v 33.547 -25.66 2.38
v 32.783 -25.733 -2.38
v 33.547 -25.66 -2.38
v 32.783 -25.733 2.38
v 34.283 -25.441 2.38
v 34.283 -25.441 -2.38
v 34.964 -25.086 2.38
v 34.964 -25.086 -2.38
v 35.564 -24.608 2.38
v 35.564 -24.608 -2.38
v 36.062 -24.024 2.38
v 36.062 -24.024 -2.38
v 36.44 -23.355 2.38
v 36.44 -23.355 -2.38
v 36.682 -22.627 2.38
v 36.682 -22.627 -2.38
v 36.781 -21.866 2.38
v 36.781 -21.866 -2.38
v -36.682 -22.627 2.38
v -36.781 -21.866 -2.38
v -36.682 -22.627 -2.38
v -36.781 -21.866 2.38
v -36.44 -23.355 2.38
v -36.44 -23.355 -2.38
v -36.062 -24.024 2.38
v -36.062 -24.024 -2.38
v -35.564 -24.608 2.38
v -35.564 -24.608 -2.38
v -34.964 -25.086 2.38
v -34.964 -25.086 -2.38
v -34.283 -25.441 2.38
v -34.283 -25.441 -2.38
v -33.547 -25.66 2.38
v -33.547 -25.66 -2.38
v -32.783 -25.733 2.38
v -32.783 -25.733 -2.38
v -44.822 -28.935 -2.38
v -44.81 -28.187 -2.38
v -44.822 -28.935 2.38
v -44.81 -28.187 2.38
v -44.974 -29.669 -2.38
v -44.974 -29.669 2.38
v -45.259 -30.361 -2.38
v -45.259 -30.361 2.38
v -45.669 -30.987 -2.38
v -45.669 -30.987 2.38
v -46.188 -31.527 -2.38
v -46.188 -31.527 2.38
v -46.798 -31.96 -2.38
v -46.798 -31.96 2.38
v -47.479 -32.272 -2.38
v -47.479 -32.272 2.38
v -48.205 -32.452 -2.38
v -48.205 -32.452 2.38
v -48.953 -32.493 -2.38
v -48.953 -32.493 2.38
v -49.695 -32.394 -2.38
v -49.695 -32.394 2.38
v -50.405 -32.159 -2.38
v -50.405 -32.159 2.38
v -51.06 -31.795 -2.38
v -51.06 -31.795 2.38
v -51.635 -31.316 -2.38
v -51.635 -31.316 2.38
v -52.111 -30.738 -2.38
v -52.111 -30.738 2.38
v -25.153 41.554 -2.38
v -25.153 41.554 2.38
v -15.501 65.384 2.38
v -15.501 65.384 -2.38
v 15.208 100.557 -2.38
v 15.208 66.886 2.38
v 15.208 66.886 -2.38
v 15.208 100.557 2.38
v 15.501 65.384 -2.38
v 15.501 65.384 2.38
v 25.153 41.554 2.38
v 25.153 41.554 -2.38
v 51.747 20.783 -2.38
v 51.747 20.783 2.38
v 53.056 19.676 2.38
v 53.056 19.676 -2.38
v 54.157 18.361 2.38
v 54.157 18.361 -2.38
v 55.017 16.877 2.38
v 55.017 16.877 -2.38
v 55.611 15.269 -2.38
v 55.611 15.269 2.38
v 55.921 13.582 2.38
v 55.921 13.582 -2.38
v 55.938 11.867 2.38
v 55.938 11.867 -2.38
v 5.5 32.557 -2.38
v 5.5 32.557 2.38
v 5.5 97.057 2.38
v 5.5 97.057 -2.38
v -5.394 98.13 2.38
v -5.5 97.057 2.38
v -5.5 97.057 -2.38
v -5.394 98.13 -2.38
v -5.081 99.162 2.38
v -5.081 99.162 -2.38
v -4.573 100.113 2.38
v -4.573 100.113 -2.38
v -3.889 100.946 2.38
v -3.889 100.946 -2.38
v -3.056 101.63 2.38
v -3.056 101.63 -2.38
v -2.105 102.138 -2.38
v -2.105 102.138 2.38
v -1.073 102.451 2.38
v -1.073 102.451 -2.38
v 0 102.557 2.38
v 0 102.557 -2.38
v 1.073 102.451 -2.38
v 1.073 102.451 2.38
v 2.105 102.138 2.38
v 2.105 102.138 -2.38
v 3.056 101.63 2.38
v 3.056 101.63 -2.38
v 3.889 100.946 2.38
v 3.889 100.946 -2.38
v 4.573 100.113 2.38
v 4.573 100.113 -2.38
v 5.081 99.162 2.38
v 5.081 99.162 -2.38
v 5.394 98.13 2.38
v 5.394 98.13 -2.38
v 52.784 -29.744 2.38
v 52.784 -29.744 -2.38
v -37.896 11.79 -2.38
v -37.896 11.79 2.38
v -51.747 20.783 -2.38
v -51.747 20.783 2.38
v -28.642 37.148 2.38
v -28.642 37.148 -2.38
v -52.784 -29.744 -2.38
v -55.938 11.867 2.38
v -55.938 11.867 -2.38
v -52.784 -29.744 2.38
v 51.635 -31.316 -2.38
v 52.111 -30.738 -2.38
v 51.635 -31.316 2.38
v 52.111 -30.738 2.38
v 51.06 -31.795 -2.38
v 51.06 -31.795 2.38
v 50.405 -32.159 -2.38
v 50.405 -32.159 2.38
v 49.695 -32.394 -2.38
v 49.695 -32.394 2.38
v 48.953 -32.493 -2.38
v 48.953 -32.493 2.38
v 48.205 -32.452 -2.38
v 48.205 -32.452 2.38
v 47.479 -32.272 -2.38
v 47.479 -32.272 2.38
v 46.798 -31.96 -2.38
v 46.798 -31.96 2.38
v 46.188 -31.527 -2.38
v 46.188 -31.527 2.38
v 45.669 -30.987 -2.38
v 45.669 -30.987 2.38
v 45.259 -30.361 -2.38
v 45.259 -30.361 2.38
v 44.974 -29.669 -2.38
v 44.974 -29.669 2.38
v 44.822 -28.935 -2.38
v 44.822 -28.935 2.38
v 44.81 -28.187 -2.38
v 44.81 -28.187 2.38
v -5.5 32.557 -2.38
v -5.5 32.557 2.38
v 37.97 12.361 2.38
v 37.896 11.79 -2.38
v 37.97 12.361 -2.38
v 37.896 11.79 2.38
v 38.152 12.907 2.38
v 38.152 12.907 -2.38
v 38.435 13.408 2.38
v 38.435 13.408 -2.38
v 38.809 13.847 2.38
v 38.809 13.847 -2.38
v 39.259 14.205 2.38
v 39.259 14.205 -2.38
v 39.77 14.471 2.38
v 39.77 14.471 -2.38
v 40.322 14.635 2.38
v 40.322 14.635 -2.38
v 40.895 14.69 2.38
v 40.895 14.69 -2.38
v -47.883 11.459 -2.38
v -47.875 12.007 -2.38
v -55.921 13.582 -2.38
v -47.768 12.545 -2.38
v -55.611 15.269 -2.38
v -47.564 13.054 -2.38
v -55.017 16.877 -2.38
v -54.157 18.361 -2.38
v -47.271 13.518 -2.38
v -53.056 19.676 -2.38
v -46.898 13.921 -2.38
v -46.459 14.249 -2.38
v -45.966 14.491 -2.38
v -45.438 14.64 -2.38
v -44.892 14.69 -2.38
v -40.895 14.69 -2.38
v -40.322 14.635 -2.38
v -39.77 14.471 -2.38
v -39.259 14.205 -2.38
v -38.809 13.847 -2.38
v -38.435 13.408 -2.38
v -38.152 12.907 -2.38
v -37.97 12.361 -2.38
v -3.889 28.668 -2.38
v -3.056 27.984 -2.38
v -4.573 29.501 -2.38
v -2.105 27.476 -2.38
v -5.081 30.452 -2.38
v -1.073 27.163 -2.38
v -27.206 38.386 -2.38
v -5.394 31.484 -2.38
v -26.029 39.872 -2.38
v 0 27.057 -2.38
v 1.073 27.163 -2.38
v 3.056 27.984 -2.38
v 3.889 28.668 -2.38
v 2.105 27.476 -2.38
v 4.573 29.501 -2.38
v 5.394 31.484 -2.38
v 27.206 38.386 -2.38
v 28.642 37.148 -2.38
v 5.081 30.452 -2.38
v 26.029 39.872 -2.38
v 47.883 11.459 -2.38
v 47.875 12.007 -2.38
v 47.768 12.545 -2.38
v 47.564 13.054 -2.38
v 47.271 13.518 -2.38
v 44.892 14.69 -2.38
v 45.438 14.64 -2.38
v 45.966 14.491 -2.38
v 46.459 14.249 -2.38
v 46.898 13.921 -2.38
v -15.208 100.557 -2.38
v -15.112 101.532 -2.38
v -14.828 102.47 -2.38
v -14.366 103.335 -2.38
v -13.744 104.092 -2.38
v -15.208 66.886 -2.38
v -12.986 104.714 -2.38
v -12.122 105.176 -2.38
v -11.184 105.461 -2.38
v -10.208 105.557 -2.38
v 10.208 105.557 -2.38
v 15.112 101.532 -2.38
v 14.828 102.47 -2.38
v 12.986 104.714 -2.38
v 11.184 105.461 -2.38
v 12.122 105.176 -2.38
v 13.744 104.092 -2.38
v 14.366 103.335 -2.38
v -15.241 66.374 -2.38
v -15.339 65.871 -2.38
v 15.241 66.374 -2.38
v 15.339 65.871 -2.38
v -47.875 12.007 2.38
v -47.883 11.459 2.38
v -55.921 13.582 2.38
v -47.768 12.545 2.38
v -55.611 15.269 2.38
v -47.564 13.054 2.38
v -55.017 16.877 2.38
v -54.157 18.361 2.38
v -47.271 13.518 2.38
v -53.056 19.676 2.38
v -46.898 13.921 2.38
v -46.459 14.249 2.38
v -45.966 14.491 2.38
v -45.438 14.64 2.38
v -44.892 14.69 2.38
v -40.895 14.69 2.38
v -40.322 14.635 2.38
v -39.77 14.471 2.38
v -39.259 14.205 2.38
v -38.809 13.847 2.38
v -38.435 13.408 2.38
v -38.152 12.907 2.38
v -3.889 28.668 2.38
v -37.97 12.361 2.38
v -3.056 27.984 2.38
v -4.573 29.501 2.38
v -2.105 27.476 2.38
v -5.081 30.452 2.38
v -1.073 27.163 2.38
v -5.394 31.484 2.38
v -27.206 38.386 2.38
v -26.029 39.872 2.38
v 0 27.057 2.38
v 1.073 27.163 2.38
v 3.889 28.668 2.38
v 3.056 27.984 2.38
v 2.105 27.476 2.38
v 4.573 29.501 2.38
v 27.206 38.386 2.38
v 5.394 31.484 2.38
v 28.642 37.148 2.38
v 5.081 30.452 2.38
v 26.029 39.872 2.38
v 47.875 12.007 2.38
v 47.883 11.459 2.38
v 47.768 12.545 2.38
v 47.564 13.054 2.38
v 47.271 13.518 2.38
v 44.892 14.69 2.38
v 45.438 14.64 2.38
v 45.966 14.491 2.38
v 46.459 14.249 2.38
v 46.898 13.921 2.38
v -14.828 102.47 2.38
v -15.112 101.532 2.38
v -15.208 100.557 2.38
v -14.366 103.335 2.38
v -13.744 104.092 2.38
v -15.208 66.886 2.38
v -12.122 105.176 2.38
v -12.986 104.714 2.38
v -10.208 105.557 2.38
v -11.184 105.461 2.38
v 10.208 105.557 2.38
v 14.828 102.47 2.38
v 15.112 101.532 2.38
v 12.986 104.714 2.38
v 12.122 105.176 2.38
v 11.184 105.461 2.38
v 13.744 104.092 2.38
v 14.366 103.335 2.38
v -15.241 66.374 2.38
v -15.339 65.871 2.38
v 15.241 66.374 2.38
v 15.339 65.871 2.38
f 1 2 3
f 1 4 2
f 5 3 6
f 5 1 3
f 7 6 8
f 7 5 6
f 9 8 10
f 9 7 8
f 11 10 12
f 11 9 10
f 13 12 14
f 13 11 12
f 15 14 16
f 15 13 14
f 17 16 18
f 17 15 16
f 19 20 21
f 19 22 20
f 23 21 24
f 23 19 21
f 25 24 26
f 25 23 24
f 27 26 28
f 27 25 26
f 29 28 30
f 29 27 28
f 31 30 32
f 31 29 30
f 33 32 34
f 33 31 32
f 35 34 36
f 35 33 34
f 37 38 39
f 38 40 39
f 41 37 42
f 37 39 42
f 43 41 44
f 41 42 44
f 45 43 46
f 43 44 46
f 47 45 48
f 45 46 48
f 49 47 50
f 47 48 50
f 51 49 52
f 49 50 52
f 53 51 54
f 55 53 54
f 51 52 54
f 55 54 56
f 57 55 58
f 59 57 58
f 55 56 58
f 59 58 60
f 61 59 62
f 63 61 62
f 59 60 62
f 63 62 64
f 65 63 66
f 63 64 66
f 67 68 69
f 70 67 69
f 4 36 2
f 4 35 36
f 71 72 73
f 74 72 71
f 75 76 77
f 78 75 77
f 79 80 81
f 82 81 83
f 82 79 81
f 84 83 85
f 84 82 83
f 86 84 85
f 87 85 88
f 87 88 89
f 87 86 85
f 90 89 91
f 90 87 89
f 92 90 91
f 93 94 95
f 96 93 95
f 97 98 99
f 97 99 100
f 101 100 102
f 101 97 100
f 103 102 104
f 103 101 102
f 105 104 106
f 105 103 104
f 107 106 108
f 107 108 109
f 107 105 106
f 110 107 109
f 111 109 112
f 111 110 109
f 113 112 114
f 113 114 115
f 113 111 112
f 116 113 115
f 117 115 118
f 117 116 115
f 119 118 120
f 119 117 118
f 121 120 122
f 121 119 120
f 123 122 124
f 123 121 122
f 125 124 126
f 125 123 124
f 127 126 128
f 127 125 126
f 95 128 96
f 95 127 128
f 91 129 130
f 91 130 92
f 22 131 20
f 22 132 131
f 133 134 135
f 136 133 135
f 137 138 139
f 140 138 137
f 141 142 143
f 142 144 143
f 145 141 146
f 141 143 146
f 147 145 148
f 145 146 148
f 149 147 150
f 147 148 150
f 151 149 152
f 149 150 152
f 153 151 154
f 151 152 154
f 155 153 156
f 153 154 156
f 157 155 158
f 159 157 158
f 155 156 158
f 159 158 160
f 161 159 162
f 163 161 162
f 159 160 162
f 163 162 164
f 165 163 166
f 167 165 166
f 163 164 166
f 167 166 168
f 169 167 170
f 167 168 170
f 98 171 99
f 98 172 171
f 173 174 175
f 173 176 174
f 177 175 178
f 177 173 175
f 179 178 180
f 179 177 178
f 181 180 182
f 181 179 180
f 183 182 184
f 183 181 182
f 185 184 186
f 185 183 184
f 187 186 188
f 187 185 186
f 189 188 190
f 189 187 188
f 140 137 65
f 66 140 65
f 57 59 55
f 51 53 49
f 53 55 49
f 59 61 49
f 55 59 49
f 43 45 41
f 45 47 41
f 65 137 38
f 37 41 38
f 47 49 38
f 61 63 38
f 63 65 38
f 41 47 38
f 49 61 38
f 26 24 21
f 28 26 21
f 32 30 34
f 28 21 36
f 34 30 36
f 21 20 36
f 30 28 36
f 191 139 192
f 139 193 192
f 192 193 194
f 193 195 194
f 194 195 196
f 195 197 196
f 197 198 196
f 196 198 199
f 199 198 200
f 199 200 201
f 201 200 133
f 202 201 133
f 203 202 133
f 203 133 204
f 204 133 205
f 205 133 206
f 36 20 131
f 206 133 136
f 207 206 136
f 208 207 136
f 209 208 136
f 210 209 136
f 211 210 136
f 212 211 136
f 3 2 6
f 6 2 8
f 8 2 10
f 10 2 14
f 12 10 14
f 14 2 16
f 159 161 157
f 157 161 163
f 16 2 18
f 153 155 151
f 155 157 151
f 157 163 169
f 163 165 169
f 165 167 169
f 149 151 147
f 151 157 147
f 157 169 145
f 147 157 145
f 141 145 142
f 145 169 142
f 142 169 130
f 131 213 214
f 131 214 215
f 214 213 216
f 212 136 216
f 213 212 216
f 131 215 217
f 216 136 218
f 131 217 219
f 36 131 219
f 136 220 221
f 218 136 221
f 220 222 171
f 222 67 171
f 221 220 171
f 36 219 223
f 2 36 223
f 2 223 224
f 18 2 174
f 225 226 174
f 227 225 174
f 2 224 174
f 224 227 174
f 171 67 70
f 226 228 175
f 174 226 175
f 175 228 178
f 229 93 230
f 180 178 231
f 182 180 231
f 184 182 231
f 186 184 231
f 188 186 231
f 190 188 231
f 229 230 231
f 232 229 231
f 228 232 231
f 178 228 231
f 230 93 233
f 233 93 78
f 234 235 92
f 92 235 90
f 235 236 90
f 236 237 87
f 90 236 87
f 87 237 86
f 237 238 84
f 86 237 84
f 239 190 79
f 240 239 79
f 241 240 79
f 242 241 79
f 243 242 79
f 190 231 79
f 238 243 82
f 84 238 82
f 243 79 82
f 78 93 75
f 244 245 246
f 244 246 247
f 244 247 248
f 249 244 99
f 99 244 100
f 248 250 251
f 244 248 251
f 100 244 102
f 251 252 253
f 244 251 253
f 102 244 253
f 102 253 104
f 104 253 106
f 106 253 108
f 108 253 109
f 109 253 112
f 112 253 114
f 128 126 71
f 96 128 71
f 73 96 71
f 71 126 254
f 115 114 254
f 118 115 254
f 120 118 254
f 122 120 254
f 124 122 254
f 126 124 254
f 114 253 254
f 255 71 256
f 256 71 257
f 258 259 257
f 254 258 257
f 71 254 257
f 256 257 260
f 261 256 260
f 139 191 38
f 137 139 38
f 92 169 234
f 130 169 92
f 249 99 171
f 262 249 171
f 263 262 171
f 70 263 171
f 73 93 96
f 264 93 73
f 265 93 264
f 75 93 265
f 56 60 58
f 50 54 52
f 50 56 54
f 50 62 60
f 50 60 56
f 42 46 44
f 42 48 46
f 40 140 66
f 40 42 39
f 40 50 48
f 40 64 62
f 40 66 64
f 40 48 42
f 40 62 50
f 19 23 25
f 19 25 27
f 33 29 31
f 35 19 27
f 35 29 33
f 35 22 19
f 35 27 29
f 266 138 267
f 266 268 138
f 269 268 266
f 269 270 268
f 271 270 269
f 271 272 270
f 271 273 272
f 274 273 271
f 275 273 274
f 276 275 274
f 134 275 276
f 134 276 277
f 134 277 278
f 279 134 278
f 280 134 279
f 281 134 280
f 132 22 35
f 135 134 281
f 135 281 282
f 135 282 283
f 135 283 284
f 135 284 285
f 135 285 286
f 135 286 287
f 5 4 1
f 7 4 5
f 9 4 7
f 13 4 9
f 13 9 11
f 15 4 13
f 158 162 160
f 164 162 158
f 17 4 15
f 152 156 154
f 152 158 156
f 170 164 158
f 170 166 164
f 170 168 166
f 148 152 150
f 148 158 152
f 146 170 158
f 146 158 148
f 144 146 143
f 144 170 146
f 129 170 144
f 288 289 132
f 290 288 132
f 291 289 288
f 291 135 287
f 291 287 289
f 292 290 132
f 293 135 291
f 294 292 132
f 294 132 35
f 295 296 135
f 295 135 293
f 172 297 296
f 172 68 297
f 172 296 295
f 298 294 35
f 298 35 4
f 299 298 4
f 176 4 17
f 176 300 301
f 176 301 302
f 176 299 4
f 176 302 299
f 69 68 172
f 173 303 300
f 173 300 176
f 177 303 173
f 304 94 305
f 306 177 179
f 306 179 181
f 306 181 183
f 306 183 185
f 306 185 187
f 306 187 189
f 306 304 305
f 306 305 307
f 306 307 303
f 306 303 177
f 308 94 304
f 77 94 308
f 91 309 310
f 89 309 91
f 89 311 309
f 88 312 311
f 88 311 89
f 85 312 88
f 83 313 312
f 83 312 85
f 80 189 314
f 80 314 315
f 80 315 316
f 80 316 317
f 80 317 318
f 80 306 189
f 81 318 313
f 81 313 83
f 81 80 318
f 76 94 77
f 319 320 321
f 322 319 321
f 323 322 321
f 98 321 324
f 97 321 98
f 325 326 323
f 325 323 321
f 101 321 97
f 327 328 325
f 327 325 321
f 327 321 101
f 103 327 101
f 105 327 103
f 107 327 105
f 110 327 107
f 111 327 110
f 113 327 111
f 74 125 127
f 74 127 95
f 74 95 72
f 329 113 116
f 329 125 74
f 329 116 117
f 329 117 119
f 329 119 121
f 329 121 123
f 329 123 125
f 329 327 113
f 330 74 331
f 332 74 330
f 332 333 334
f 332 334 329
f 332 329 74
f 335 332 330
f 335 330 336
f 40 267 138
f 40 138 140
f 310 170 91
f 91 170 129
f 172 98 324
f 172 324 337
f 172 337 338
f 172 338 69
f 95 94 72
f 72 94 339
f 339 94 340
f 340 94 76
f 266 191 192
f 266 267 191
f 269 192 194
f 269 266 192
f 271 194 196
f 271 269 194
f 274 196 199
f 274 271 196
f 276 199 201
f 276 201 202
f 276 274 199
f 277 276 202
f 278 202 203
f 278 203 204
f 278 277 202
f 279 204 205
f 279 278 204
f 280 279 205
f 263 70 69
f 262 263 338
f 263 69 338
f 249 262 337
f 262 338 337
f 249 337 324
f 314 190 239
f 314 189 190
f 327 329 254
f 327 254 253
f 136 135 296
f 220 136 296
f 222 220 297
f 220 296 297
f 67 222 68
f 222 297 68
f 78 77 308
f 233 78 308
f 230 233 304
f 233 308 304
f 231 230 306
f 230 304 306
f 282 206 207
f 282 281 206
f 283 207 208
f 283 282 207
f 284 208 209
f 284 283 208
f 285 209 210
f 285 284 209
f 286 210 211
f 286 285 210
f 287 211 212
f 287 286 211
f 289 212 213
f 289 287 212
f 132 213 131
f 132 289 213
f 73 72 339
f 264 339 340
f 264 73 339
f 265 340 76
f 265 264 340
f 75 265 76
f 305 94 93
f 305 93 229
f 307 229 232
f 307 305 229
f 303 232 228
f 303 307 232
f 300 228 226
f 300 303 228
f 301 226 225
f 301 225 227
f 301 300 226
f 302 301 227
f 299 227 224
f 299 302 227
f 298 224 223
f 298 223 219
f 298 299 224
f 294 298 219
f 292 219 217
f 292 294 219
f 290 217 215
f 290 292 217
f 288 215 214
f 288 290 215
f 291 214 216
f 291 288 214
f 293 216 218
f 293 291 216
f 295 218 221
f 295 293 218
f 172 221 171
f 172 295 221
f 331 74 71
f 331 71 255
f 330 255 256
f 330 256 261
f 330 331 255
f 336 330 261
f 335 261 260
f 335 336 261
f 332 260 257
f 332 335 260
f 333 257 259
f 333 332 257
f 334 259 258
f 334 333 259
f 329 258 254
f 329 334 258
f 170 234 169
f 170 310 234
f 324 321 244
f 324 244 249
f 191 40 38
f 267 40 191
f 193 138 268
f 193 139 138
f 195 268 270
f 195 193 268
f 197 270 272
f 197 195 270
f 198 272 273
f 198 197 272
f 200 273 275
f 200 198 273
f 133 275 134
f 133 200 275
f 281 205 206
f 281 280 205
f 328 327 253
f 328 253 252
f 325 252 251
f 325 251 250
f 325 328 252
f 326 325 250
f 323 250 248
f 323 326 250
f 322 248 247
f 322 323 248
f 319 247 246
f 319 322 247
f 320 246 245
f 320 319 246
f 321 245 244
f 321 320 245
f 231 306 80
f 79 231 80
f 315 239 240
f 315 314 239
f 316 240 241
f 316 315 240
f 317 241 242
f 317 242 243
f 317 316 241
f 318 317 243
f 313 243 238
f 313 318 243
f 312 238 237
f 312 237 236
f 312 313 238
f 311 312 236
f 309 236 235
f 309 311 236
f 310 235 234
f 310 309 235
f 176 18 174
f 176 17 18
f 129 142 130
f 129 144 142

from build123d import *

# Parameters (mm, degrees)
SALIENTE_EXTRUIR1_DEPTH    = 2.38
REDONDEO1_R                = 4
REDONDEO2_R                = 4
REDONDEO3_R                = 4
REDONDEO4_R                = 3
CORTAR_EXTRUIR1_DEPTH      = 119.368571569
CORTAR_EXTRUIR1_DEPTH_BACK = 119.368571569
CORTAR_EXTRUIR2_DEPTH      = 119.368571569
SALIENTE_EXTRUIR2_DEPTH    = 4.76
REDONDEO5_R                = 10


with BuildPart() as part:
    # Croquis1 → Saliente-Extruir1 (new, symmetric)
    with BuildSketch(Plane.XY):
        with BuildLine():
            Line((5.5, 65.157151242), (15.208163591, 65.157151242))
            Line((15.208163591, 65.157151242), (15.208163591, 103.706209284))
            Line((15.208163591, 103.706209284), (-15.208163591, 103.706209284))
            Line((-15.208163591, 103.706209284), (-15.208163591, 65.157151242))
            Line((-15.208163591, 65.157151242), (-5.5, 65.157151242))
            Line((-5.5, 65.157151242), (-5.5, 82.556930634))
            ThreePointArc((-5.5, 82.556930634), (0, 88.056930634), (5.5, 82.556930634))
            Line((5.5, 82.556930634), (5.5, 65.157151242))
        make_face()
        with BuildLine():
            Line((56.996730438, 25.832022394), (15.208163591, 65.157151242))
            Line((15.208163591, 65.157151242), (5.5, 65.157151242))
            Line((5.5, 65.157151242), (5.5, 42.556930634))
            ThreePointArc((5.5, 42.556930634), (0, 37.056930634), (-5.5, 42.556930634))
            Line((-5.5, 42.556930634), (-5.5, 65.157151242))
            Line((-5.5, 65.157151242), (-15.208163591, 65.157151242))
            Line((-15.208163591, 65.157151242), (-56.996730438, 25.832022394))
            Line((-56.996730438, 25.832022394), (-52.784065, -29.74367502))
            Line((-52.784065, -29.74367502), (-43.642993924, -43.246554306))
            Line((-43.642993924, -43.246554306), (-48.133553694, 14.690410374))
            Line((-48.133553694, 14.690410374), (-37.992388192, 14.690410374))
            Line((-37.992388192, 14.690410374), (-36.652824186, -25.733224315))
            Line((-36.652824186, -25.733224315), (36.652824186, -25.733224315))
            Line((36.652824186, -25.733224315), (37.992388192, 14.690410374))
            Line((37.992388192, 14.690410374), (48.133553694, 14.690410374))
            Line((48.133553694, 14.690410374), (43.642993924, -43.246554306))
            Line((43.642993924, -43.246554306), (52.784065, -29.74367502))
            Line((52.784065, -29.74367502), (56.996730438, 25.832022394))
        make_face()
    extrude(amount=SALIENTE_EXTRUIR1_DEPTH, both=True)

    # Redondeo1
    redondeo1_edges = [part.edges().sort_by_distance(p)[0] for p in [
        (43.642993924, -43.246554306, 0),
        (-43.642993924, -43.246554306, 0),
    ]]
    fillet(redondeo1_edges, radius=REDONDEO1_R)

    # Redondeo2
    redondeo2_edges = [part.edges().sort_by_distance(p)[0] for p in [
        (36.652824186, -25.733224315, 0),
        (-36.652824186, -25.733224315, 0),
    ]]
    fillet(redondeo2_edges, radius=REDONDEO2_R)

    # Redondeo3
    redondeo3_edges = [part.edges().sort_by_distance(p)[0] for p in [
        (56.996730438, 25.832022394, 0),
        (-56.996730438, 25.832022394, 0),
        (-15.208163591, 65.157151242, 0),
        (-15.208163591, 103.706209284, 0),
        (15.208163591, 103.706209284, 0),
        (15.208163591, 65.157151242, 0),
    ]]
    fillet(redondeo3_edges, radius=REDONDEO3_R)

    # Redondeo4
    redondeo4_edges = [part.edges().sort_by_distance(p)[0] for p in [
        (48.133553694, 14.690410374, 0),
        (37.992388192, 14.690410374, 0),
        (-37.992388192, 14.690410374, 0),
        (-48.133553694, 14.690410374, 0),
    ]]
    fillet(redondeo4_edges, radius=REDONDEO4_R)

    # Croquis2 → Cortar-Extruir1 (cut, two sides: drawn at the far end of the back side and taken through both)
    with BuildSketch(Plane(origin=(0, 0, -2.38), x_dir=(-1, 0, 0), z_dir=(0, 0, -1)).offset(-CORTAR_EXTRUIR1_DEPTH_BACK)):
        with BuildLine():
            Line((5.5, 82.556930634), (5.5, 12.556930634))
            ThreePointArc((5.5, 12.556930634), (0, 7.056930634), (-5.5, 12.556930634))
            Line((-5.5, 12.556930634), (-5.5, 82.556930634))
            ThreePointArc((-5.5, 82.556930634), (0, 88.056930634), (5.5, 82.556930634))
        make_face()
    extrude(amount=CORTAR_EXTRUIR1_DEPTH + CORTAR_EXTRUIR1_DEPTH_BACK, mode=Mode.SUBTRACT)

    # Croquis3 → Cortar-Extruir2 (cut, through all)
    with BuildSketch(Plane.XY.offset(2.38)):
        with BuildLine():
            Line((-56.366042887, 17.511660625), (-28.64196137, 37.147983648))
            ThreePointArc((-28.64196137, 37.147983648), (-26.58175129, 39.100934084), (-25.153332254, 41.554115699))
            Line((-25.153332254, 41.554115699), (-15.50076552, 65.383868903))
            ThreePointArc((-15.50076552, 65.383868903), (-15.281995467, 66.120614903), (-15.208163591, 66.885601085))
            Line((-15.208163591, 66.885601085), (-15.208163591, 82.556930634))
            Line((-15.208163591, 82.556930634), (15.208163591, 82.556930634))
            Line((15.208163591, 82.556930634), (15.208163591, 66.885601085))
            ThreePointArc((15.208163591, 66.885601085), (15.281995467, 66.120614903), (15.50076552, 65.383868903))
            Line((15.50076552, 65.383868903), (25.153332254, 41.554115699))
            ThreePointArc((25.153332254, 41.554115699), (26.58175129, 39.100934084), (28.64196137, 37.147983648))
            Line((28.64196137, 37.147983648), (56.366042887, 17.511660625))
            Line((56.366042887, 17.511660625), (71.467091409, 17.511660625))
            Line((71.467091409, 17.511660625), (71.467091409, 120.054882747))
            Line((71.467091409, 120.054882747), (-63.851265514, 120.054882747))
            Line((-63.851265514, 120.054882747), (-63.851265514, 17.511660625))
            Line((-63.851265514, 17.511660625), (-56.366042887, 17.511660625))
        make_face()
    extrude(amount=-CORTAR_EXTRUIR2_DEPTH, mode=Mode.SUBTRACT)

    # Croquis4 → Saliente-Extruir2 (add)
    with BuildSketch(Plane.XY.offset(2.38)):
        with BuildLine():
            Line((-5.5, 32.556930634), (-5.5, 0))
            Line((-5.5, 0), (5.5, 0))
            Line((5.5, 0), (5.5, 32.556930634))
            ThreePointArc((5.5, 32.556930634), (0, 27.056930634), (-5.5, 32.556930634))
        make_face()
        with BuildLine():
            Line((5.5, 97.056930634), (5.5, 82.556930634))
            Line((5.5, 82.556930634), (15.208163591, 82.556930634))
            Line((15.208163591, 82.556930634), (15.208163591, 100.556930634))
            ThreePointArc((15.208163591, 100.556930634), (13.743697497, 104.09246454), (10.208163591, 105.556930634))
            Line((10.208163591, 105.556930634), (-10.208163591, 105.556930634))
            ThreePointArc((-10.208163591, 105.556930634), (-13.743697497, 104.09246454), (-15.208163591, 100.556930634))
            Line((-15.208163591, 100.556930634), (-15.208163591, 82.556930634))
            Line((-15.208163591, 82.556930634), (-5.5, 82.556930634))
            Line((-5.5, 82.556930634), (-5.5, 97.056930634))
            ThreePointArc((-5.5, 97.056930634), (0, 102.556930634), (5.5, 97.056930634))
        make_face()
    extrude(amount=-SALIENTE_EXTRUIR2_DEPTH)

    # Redondeo5
    redondeo5_edges = [part.edges().sort_by_distance(p)[0] for p in [
        (-56.366042887, 17.511660625, 0),
        (56.366042887, 17.511660625, 0),
    ]]
    fillet(redondeo5_edges, radius=REDONDEO5_R)


solid = part.part
